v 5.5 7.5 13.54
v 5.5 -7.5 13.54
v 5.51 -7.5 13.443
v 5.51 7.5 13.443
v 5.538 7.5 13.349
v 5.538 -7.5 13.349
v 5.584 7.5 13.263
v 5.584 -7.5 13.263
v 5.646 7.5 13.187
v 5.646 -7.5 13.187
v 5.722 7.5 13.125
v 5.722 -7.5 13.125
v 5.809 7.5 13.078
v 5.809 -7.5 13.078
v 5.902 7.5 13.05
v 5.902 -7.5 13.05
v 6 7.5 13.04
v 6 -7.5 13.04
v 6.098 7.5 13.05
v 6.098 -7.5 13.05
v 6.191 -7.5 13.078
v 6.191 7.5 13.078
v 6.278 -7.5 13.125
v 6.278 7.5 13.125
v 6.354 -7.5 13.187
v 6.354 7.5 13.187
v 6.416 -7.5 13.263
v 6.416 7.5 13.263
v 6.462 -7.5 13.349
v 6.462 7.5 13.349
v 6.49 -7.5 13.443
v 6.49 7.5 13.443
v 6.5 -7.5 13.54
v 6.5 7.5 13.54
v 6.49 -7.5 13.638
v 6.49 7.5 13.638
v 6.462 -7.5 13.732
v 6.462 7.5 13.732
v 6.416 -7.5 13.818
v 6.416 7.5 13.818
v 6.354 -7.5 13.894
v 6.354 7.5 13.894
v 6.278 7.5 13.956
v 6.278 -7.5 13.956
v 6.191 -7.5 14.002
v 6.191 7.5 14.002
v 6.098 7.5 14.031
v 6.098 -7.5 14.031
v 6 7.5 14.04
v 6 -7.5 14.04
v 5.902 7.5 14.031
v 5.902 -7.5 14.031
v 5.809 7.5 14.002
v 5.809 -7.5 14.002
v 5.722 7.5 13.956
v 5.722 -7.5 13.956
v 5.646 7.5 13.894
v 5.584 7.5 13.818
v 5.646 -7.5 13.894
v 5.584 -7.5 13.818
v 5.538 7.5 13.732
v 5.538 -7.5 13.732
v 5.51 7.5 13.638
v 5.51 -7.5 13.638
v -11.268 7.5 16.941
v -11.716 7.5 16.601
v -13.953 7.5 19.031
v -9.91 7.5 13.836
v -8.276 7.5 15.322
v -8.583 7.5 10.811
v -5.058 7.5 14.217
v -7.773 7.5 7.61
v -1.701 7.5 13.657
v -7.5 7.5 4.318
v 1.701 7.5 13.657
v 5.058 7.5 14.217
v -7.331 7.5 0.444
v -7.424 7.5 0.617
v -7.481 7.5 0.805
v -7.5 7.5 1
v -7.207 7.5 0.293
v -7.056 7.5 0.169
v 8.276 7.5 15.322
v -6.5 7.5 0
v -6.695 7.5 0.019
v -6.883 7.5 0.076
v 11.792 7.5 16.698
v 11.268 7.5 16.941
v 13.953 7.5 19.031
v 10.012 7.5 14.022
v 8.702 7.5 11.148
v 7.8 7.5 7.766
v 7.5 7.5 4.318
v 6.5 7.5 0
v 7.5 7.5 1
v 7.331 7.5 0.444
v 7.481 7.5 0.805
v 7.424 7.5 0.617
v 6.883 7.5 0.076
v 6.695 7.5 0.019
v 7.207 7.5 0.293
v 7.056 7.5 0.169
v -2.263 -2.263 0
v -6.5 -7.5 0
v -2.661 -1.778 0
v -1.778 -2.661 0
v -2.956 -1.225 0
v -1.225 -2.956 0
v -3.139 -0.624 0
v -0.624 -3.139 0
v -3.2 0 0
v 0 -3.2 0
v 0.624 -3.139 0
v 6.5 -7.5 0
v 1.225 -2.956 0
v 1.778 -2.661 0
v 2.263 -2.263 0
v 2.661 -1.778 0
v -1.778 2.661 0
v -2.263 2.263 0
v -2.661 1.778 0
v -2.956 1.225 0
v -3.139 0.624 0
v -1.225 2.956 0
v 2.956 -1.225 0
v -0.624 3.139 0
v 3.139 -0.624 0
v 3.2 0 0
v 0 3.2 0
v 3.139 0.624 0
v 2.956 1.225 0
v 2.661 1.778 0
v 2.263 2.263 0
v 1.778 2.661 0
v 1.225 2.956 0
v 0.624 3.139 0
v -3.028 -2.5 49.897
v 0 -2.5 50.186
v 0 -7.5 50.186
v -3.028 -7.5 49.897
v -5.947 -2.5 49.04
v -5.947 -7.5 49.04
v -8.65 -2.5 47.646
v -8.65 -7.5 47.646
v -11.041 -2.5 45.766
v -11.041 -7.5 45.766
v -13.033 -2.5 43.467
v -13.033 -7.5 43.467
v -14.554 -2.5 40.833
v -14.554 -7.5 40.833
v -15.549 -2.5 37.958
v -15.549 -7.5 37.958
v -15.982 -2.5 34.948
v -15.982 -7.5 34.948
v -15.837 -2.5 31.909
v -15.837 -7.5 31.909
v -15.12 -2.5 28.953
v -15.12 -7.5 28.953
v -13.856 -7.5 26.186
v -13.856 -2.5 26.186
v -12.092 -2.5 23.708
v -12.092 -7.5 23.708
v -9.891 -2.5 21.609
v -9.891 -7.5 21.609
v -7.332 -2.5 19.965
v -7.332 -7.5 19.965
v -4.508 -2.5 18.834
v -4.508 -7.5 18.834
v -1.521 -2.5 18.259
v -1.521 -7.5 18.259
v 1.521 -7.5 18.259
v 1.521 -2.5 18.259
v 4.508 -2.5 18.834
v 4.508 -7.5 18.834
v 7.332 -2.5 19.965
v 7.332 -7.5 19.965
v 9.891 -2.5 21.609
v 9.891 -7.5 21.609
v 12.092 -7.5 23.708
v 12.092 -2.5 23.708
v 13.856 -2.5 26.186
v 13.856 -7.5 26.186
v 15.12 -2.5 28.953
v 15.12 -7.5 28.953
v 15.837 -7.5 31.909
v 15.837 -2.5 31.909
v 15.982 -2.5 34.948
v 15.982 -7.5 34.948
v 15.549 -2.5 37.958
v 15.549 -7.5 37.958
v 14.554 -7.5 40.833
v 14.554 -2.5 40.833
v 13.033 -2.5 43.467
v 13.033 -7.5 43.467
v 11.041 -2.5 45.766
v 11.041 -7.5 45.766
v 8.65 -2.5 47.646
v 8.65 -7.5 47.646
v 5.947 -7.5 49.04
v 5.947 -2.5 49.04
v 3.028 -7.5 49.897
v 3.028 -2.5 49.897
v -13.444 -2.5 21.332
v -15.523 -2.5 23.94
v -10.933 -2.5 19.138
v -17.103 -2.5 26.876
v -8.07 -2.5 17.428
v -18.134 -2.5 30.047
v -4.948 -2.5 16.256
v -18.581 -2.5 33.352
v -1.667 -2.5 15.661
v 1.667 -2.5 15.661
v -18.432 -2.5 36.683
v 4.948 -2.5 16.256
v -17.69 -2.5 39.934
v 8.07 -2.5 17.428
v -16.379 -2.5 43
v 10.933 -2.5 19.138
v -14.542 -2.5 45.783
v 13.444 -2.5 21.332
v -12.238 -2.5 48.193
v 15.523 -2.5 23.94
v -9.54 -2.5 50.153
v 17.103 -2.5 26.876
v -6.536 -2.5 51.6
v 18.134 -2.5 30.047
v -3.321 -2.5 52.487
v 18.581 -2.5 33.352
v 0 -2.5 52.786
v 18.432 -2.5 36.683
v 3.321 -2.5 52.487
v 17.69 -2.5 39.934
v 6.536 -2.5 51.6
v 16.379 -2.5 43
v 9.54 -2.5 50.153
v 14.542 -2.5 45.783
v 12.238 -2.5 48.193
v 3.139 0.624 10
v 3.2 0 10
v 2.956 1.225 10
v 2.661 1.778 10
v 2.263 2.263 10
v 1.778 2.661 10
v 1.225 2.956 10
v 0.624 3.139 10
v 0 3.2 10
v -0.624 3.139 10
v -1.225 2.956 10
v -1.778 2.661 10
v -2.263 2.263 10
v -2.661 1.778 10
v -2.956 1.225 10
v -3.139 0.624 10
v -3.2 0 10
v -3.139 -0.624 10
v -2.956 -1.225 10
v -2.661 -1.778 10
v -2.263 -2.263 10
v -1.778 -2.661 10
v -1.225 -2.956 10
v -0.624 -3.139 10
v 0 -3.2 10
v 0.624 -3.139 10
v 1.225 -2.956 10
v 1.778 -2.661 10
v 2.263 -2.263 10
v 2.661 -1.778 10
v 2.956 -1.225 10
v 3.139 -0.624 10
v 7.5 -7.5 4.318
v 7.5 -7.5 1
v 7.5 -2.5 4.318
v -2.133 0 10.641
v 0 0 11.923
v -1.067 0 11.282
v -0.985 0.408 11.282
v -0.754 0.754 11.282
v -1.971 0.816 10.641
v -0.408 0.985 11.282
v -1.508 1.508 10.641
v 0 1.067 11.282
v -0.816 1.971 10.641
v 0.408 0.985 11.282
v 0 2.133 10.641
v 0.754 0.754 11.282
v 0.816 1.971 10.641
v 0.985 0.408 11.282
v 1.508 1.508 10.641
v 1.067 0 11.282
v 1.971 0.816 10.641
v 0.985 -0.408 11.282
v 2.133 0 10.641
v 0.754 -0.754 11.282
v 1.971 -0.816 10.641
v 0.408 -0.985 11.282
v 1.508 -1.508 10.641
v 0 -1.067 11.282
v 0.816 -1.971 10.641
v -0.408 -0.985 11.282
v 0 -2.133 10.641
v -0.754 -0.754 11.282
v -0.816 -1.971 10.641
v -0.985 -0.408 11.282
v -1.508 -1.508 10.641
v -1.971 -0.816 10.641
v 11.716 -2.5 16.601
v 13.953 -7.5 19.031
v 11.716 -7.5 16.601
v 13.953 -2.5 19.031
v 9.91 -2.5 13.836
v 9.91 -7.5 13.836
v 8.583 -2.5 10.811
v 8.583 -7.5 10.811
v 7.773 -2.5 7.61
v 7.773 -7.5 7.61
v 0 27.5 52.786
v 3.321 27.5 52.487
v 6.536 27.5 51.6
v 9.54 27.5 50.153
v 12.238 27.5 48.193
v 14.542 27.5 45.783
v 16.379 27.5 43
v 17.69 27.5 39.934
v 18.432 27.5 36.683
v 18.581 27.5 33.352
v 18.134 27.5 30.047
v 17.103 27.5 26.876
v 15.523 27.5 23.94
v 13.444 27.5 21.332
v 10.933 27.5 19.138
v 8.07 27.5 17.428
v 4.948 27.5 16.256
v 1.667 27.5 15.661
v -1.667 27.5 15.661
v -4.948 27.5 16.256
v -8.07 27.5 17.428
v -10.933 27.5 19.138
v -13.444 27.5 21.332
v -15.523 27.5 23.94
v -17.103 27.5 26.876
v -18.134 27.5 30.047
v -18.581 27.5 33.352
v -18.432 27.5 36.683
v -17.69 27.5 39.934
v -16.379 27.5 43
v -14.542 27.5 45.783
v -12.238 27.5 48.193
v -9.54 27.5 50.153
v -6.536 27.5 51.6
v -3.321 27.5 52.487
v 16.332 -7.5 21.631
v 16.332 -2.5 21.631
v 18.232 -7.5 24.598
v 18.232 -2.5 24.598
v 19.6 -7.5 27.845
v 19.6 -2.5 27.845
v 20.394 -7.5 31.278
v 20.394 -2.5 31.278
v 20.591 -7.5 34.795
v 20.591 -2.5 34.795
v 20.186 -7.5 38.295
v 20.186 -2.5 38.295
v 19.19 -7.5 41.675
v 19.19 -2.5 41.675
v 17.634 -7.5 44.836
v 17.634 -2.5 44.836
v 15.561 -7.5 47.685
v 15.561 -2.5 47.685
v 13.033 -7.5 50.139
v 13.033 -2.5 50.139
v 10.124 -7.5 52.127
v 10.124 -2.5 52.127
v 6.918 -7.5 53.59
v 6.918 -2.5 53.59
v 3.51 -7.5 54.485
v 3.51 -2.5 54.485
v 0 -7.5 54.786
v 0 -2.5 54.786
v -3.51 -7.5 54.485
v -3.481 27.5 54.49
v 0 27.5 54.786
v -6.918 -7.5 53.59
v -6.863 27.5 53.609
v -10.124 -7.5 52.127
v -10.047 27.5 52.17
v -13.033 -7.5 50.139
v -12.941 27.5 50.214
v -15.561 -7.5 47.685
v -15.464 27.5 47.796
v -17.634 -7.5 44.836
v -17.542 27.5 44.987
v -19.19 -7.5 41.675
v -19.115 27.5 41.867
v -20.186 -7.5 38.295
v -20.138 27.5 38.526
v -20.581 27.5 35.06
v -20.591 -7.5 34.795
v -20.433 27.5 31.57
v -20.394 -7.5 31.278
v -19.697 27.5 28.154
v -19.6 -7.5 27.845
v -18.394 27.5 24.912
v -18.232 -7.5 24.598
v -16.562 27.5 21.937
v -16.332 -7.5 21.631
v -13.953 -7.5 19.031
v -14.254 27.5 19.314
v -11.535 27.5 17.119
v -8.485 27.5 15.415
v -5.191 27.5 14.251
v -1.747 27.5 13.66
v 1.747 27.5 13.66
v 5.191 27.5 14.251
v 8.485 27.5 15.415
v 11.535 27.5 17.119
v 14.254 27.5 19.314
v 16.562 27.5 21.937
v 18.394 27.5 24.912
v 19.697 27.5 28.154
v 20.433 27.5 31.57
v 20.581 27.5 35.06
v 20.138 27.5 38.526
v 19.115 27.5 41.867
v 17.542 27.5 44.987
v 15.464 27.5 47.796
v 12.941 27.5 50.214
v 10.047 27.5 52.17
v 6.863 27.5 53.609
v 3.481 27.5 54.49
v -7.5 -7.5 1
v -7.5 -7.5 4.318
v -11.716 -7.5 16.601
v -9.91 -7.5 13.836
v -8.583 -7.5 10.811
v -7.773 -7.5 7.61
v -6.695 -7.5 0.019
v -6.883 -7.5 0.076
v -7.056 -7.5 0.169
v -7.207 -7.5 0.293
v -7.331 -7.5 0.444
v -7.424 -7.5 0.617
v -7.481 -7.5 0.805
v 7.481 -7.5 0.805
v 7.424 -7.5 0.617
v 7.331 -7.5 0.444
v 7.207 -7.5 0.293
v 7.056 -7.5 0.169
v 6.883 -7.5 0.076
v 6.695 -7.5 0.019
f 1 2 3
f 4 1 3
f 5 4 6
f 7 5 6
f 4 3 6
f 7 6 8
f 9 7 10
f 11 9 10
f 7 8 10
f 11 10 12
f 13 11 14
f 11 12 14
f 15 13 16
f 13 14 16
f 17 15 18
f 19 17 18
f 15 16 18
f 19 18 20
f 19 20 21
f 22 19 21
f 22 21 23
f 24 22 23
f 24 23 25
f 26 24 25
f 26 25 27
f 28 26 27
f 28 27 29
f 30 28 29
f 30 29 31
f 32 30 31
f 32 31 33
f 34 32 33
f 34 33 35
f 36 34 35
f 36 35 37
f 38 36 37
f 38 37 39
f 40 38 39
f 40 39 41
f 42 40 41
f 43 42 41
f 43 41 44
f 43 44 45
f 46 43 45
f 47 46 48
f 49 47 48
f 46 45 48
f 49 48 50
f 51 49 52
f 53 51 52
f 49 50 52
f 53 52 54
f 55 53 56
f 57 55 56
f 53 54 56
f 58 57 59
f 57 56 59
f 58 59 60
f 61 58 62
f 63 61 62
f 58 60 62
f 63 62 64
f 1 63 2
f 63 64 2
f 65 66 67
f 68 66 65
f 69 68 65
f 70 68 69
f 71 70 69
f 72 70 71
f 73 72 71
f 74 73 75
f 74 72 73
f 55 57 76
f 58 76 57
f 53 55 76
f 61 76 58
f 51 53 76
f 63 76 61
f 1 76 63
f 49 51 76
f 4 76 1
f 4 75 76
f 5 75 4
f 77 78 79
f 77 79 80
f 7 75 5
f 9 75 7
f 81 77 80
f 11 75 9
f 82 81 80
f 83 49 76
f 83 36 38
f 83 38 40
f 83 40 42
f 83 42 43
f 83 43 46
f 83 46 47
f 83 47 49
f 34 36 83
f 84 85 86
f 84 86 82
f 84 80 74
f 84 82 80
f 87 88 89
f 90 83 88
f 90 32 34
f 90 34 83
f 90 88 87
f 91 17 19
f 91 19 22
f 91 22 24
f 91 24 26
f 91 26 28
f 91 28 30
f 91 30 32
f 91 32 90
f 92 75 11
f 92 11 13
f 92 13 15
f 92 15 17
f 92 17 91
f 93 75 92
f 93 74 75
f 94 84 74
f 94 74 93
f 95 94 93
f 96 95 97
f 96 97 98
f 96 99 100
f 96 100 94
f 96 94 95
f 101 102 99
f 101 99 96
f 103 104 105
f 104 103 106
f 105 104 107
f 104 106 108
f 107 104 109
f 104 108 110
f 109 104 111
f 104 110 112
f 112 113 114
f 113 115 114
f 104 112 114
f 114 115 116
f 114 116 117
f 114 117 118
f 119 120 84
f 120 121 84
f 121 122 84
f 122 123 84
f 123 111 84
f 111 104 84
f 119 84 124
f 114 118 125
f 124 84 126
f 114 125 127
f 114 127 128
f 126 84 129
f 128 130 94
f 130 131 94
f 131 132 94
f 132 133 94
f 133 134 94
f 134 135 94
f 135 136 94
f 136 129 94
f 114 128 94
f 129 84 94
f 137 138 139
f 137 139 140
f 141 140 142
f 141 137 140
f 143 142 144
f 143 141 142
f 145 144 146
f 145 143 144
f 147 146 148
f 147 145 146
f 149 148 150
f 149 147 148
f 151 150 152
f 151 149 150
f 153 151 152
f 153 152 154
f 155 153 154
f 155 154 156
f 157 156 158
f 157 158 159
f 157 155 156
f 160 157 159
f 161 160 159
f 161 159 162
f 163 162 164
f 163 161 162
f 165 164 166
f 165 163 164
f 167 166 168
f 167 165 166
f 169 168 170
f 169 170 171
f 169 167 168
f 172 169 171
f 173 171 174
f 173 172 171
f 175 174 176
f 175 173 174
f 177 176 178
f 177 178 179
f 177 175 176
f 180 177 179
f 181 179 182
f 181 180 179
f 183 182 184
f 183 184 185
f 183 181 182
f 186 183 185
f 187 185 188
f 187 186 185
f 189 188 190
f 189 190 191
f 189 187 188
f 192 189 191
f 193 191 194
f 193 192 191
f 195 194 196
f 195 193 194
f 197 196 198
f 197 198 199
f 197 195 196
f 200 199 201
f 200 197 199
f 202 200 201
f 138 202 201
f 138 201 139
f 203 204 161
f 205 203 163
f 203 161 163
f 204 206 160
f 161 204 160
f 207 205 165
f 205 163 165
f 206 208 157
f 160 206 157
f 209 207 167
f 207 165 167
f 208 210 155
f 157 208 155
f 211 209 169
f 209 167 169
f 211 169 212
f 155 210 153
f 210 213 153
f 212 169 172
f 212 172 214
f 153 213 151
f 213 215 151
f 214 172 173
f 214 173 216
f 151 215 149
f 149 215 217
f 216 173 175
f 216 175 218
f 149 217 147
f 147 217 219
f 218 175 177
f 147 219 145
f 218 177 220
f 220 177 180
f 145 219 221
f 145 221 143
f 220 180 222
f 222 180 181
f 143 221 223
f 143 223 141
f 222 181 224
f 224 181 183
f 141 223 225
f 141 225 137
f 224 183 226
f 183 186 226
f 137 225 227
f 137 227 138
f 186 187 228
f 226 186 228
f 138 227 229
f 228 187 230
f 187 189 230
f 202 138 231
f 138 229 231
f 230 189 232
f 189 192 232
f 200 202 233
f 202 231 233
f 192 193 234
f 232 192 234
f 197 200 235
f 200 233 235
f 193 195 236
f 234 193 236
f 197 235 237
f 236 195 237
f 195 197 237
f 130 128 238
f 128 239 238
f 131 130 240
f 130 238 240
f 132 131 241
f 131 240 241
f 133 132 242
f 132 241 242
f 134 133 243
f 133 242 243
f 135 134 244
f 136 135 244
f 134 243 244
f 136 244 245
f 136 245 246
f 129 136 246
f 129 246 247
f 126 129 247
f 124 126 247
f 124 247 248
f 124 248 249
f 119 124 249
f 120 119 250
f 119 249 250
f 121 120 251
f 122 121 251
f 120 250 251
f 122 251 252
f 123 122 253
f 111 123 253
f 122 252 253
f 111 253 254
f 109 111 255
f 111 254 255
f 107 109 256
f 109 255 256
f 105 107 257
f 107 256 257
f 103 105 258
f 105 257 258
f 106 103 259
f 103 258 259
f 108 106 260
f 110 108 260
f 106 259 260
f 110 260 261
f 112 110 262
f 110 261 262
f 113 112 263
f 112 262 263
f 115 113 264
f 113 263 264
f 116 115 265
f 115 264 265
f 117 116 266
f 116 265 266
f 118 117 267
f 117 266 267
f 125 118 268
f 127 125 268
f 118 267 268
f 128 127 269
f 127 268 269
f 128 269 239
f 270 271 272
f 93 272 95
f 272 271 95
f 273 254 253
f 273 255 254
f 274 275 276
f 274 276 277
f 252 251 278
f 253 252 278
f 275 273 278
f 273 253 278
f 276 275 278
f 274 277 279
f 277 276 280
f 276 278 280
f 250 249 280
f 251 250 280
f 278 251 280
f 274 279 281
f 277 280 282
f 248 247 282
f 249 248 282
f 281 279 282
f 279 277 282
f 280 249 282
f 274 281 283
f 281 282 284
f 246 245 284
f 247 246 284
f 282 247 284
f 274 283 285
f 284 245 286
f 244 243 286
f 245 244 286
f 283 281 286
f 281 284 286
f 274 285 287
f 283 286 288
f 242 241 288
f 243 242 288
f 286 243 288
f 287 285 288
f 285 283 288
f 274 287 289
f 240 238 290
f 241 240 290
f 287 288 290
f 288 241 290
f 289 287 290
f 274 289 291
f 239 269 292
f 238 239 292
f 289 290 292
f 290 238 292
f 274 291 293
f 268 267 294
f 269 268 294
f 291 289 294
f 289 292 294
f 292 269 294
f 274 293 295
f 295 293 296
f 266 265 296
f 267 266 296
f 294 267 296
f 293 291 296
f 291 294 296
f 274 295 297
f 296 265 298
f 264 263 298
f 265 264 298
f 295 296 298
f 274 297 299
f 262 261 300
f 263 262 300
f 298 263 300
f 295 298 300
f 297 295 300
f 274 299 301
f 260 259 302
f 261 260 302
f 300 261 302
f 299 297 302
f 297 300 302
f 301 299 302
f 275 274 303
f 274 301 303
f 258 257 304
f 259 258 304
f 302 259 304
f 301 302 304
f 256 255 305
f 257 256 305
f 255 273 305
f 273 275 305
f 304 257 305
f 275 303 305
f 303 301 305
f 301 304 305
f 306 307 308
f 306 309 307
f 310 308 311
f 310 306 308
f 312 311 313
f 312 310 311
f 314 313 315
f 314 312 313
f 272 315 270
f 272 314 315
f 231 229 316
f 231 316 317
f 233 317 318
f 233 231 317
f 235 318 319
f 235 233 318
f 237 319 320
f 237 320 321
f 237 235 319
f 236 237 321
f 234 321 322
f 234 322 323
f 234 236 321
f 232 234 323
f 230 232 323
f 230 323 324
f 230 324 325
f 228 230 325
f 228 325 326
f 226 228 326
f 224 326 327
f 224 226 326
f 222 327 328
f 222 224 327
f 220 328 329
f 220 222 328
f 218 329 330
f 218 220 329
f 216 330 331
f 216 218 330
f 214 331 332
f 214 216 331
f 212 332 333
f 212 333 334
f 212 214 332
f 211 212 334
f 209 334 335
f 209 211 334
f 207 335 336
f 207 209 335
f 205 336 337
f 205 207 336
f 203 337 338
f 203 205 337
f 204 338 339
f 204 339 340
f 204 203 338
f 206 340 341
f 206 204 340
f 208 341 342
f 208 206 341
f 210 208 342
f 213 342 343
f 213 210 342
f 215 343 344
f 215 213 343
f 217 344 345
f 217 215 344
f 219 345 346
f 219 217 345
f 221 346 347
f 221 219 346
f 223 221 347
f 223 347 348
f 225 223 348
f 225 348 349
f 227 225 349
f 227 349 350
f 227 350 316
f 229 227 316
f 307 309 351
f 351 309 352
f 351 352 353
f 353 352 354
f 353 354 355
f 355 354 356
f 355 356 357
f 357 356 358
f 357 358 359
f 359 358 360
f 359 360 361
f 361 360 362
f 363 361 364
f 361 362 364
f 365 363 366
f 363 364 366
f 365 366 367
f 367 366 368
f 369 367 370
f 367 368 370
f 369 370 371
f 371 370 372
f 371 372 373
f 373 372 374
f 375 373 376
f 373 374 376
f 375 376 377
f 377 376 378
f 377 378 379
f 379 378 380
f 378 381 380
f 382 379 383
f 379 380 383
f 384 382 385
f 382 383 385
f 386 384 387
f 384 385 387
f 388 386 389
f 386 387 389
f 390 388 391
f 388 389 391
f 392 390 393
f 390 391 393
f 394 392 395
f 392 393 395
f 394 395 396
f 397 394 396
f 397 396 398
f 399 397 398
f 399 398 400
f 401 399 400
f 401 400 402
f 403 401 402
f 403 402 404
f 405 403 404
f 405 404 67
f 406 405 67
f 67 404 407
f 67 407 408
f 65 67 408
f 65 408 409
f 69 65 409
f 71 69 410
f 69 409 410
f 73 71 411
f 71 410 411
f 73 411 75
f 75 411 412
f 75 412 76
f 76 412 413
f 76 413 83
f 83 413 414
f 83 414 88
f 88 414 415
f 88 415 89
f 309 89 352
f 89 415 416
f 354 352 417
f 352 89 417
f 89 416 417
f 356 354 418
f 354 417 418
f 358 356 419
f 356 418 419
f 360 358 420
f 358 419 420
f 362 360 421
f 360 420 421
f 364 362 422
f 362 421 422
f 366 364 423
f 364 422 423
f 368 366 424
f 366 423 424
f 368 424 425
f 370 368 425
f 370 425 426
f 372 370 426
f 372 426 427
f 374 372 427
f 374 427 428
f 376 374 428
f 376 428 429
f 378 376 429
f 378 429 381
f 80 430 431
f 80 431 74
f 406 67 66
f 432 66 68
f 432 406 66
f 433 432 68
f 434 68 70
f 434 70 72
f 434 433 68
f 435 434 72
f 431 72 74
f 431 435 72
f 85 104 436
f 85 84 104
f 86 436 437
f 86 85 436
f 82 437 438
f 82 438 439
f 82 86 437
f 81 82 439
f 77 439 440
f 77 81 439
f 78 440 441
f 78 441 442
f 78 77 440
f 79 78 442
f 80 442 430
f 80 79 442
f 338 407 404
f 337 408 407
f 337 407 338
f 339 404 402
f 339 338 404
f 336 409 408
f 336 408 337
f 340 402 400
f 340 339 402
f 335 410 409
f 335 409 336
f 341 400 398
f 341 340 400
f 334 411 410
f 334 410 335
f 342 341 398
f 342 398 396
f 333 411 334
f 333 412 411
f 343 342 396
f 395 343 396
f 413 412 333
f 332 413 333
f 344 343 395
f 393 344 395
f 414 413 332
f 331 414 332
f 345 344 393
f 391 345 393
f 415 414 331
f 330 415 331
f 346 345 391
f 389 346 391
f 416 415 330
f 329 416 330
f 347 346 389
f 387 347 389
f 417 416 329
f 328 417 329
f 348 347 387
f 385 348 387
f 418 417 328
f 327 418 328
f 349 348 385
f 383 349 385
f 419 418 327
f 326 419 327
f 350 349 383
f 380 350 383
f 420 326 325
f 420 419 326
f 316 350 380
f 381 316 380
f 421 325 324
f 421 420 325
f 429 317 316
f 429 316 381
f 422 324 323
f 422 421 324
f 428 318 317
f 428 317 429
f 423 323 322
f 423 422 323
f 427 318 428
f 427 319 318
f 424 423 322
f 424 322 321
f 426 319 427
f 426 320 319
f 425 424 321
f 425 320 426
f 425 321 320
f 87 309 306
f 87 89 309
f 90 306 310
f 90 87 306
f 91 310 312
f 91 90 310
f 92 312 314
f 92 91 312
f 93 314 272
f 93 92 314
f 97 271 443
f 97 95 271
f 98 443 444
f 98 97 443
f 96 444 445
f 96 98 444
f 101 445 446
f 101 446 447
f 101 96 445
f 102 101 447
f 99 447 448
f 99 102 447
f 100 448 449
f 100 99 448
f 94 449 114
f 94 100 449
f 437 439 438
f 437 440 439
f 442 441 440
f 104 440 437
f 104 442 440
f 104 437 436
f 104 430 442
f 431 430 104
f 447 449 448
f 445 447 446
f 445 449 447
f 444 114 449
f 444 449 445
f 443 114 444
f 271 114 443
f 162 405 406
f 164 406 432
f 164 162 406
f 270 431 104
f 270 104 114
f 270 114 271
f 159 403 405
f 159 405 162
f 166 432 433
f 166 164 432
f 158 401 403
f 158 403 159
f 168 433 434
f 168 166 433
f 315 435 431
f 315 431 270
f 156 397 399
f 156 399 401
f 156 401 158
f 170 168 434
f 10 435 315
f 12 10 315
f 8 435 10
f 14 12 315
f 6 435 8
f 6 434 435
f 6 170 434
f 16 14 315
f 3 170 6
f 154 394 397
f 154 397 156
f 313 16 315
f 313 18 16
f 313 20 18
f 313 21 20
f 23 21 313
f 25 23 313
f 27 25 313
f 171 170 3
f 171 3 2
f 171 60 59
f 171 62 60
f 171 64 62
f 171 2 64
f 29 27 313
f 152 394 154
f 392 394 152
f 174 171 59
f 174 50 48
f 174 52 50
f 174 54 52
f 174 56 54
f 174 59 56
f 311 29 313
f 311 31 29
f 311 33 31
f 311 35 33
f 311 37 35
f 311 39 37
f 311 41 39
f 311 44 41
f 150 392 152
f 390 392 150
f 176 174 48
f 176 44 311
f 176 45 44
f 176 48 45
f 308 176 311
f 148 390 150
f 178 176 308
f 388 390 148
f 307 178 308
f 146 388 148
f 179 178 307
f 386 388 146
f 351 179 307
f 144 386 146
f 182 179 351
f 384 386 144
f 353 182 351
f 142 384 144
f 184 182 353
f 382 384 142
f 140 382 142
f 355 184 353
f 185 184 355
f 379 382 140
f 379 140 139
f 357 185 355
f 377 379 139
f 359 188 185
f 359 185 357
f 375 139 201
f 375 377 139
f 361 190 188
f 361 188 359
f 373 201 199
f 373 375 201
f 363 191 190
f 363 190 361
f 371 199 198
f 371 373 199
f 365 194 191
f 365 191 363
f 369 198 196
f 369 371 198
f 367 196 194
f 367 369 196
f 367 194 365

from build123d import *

# Parameters (mm, degrees)
ESQUISSE1_W                    = 15
ESQUISSE1_H                    = 15
BOSS_EXTRU_1_DEPTH             = 15
TROUS_DE_CENTRAGE_5_0MM1_D     = 6.4
TROUS_DE_CENTRAGE_5_0MM1_DEPTH = 10
TROUS_DE_CENTRAGE_5_0MM1_TIP   = 1.922753981
BOSS_EXTRU_2_DEPTH             = 20
BOSS_EXTRU_2_DEPTH_BACK        = 10
ESQUISSE4_R                    = 20.6
ESQUISSE4_R_2                  = 18.6
ESQUISSE5_R                    = 16
BOSS_EXTRU_3_DEPTH             = 5
CONG_1_R                       = 20
CONG_2_R                       = 1
TROUS_DE_CENTRAGE_1_0MM1_D     = 1


with BuildPart() as part:
    # Esquisse1 → Boss.-Extru.1 (new body)
    with BuildSketch(Plane.XY):
        Rectangle(ESQUISSE1_W, ESQUISSE1_H)
    extrude(amount=BOSS_EXTRU_1_DEPTH)

    # Trous de centrage Ø5.0mm1
    with Locations(Plane(origin=(0, 0, 0), x_dir=(-1, 0, 0), z_dir=(0, 0, -1))):
        with Locations((0, 0)):
            Hole(TROUS_DE_CENTRAGE_5_0MM1_D / 2, depth=TROUS_DE_CENTRAGE_5_0MM1_DEPTH)
            with Locations((0, 0, -(TROUS_DE_CENTRAGE_5_0MM1_DEPTH + TROUS_DE_CENTRAGE_5_0MM1_TIP / 2))):  # 118° drill point
                Cone(0, TROUS_DE_CENTRAGE_5_0MM1_D / 2, TROUS_DE_CENTRAGE_5_0MM1_TIP, mode=Mode.SUBTRACT)

    # Esquisse4 → Boss.-Extru.2 (add, two sides: drawn at the far end of the back side and taken through both)
    with BuildSketch(Plane(origin=(0, 7.5, 0), x_dir=(1, 0, 0), z_dir=(0, 1, 0)).offset(-BOSS_EXTRU_2_DEPTH_BACK)):
        with Locations(Location((0, -34.186192952, 0), (0, 0, 270))):
            Circle(ESQUISSE4_R)
        with Locations(Location((0, -34.186192952, 0), (0, 0, 270))):
            Circle(ESQUISSE4_R_2, mode=Mode.SUBTRACT)
    extrude(amount=BOSS_EXTRU_2_DEPTH + BOSS_EXTRU_2_DEPTH_BACK)

    # Esquisse5 → Boss.-Extru.3 (add)
    with BuildSketch(Plane.XZ.offset(2.5)):
        with BuildLine():
            Line((-7.5, 15), (7.5, 15))
            ThreePointArc((7.5, 15), (0, 54.786192952), (-7.5, 15))
        make_face()
        with Locations(Location((0, 34.186192952, 0), (0, 0, 90))):
            Circle(ESQUISSE5_R, mode=Mode.SUBTRACT)
    extrude(amount=BOSS_EXTRU_3_DEPTH)

    # Congé1
    cong_1_edges = [part.edges().sort_by_distance(p)[0] for p in [
        (-7.5, 2.5, 15),
        (7.5, 2.5, 15),
    ]]
    fillet(cong_1_edges, radius=CONG_1_R)

    # Congé2
    cong_2_edges = [part.edges().sort_by_distance(p)[0] for p in [
        (-7.5, 0, 0),
        (7.5, 0, 0),
    ]]
    fillet(cong_2_edges, radius=CONG_2_R)

    # Trous de centrage Ø1.0mm1 (through all)
    with Locations(Plane(origin=(0, 7.5, 0), x_dir=(1, 0, 0), z_dir=(0, 1, 0))):
        with Locations((6, -13.54037013)):
            Hole(TROUS_DE_CENTRAGE_1_0MM1_D / 2)


solid = part.part
